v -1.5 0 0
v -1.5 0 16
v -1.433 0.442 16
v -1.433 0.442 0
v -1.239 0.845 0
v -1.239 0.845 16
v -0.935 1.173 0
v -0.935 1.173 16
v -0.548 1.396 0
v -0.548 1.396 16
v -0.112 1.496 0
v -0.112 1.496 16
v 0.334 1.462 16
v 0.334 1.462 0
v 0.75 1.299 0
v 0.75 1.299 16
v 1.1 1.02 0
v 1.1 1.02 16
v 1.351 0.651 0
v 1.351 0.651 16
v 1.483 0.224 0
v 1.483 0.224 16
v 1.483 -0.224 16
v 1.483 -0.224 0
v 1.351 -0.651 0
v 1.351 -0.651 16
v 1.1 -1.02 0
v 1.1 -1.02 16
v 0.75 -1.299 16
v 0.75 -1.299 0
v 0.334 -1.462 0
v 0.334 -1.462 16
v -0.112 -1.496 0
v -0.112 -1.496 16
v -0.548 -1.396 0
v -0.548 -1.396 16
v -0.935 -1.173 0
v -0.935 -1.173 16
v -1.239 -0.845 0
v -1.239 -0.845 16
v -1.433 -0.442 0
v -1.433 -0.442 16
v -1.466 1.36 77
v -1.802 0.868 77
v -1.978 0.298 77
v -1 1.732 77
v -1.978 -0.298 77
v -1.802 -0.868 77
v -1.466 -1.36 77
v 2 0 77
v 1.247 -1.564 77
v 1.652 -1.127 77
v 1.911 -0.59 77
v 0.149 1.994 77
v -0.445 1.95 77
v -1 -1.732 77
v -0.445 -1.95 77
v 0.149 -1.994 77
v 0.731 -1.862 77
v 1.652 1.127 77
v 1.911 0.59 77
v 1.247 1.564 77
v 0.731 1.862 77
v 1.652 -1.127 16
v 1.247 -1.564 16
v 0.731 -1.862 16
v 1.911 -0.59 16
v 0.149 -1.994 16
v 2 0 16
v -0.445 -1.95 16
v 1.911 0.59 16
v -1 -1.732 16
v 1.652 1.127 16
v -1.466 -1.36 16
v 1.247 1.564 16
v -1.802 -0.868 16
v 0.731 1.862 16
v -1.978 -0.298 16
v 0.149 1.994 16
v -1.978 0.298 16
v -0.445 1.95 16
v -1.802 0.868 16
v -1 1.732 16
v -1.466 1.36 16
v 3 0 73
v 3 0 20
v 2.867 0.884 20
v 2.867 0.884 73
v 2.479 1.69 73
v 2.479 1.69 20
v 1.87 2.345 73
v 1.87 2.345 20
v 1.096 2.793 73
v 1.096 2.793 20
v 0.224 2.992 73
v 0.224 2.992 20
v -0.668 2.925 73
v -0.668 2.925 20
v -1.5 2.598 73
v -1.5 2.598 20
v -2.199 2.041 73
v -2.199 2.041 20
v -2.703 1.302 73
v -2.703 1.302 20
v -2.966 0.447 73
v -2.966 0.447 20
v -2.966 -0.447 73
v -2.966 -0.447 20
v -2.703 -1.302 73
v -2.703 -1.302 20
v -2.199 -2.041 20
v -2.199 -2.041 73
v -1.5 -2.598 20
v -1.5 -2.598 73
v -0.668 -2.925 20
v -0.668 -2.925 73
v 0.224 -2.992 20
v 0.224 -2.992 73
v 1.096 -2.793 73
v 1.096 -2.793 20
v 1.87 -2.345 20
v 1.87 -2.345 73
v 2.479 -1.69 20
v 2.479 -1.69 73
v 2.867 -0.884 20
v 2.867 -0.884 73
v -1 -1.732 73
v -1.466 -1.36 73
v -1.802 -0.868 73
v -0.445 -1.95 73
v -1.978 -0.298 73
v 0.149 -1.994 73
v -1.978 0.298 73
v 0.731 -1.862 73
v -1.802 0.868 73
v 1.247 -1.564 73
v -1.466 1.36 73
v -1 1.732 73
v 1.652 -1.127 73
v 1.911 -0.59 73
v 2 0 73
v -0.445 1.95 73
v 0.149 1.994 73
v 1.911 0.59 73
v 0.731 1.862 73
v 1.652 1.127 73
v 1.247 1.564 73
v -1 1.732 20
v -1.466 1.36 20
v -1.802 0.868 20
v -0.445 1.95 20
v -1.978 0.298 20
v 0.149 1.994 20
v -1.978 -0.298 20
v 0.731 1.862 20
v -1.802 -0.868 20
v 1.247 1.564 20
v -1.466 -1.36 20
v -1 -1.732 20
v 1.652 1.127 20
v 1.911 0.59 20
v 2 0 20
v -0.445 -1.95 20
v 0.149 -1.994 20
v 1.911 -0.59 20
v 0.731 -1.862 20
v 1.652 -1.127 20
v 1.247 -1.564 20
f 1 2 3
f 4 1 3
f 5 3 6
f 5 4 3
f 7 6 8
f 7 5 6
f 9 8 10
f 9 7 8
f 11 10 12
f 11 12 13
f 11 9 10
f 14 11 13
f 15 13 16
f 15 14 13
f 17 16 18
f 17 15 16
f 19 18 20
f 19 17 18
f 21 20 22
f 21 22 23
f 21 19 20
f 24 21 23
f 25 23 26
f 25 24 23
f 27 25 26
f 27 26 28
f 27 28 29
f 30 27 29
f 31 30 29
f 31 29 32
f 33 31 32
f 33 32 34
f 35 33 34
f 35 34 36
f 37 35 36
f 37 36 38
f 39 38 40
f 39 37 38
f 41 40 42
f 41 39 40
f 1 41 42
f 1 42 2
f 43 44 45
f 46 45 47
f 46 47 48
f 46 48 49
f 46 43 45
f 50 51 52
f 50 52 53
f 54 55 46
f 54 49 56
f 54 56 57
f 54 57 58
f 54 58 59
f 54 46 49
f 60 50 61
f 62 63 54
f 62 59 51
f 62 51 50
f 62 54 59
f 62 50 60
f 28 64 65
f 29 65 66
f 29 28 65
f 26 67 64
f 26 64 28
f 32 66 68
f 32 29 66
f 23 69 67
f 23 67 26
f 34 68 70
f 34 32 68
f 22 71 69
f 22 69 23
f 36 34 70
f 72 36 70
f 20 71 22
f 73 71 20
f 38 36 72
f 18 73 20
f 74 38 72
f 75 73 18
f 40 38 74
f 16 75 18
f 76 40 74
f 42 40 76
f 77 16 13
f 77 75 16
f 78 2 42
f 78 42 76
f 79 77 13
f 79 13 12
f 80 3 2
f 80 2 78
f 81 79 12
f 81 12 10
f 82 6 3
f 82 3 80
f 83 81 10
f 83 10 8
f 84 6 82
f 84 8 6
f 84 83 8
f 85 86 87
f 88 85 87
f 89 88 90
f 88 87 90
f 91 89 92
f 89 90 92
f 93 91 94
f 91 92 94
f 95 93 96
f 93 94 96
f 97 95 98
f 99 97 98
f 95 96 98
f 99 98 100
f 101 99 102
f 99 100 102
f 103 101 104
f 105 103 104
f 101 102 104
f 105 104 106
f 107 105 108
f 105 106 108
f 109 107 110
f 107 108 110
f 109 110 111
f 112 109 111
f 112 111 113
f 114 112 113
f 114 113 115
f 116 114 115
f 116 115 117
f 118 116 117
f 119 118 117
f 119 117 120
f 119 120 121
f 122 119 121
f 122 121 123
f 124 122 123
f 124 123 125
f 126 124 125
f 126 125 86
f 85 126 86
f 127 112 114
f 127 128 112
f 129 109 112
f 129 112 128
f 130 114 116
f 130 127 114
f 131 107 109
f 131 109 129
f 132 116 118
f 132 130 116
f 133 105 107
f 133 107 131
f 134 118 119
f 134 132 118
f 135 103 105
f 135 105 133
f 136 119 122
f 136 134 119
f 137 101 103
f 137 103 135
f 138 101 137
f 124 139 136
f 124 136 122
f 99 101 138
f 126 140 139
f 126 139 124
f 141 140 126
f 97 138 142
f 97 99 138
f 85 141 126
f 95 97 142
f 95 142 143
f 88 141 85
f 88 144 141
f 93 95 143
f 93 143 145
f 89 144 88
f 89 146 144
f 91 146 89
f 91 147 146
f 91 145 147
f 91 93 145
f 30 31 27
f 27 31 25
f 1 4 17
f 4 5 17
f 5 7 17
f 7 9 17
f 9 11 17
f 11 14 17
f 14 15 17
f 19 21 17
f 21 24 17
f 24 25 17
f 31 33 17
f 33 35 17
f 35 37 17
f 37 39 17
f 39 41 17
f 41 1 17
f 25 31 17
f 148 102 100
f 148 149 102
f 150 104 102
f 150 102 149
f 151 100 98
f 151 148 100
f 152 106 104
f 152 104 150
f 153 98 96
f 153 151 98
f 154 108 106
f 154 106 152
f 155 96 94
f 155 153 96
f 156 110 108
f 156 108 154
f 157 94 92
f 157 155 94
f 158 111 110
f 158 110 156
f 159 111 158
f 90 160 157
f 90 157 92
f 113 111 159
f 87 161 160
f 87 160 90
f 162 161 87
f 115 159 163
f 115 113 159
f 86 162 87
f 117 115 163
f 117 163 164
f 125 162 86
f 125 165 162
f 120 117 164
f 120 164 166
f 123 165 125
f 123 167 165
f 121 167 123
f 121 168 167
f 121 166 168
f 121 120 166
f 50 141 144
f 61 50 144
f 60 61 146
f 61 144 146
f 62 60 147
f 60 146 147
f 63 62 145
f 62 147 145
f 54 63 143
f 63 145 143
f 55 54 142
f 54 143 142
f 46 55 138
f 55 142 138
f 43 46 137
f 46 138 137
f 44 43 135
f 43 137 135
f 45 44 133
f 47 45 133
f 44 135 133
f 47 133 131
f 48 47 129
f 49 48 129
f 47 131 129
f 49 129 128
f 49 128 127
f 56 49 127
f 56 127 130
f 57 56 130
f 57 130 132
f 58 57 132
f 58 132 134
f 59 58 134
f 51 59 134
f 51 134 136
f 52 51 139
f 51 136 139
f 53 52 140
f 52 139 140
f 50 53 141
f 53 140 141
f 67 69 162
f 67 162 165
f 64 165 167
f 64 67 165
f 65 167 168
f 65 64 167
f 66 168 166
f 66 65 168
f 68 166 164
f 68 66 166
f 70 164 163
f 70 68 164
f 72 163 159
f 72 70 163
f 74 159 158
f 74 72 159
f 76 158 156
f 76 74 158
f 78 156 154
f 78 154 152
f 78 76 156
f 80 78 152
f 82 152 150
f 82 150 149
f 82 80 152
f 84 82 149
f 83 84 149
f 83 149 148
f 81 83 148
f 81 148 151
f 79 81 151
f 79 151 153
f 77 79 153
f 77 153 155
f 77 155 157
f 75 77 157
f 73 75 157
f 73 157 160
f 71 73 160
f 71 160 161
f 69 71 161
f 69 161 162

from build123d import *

# Parameters (mm, degrees)
ESBO_O1_R                = 3
RESSALTO_EXTRUS_O1_DEPTH = 77
CORTE_EXTRUS_O1_START    = -4
ESBO_O2_R                = 3
ESBO_O2_R_2              = 2
CORTE_EXTRUS_O1_DEPTH    = 4
ESBO_O3_R                = 3
ESBO_O3_R_2              = 2
CORTE_EXTRUS_O2_DEPTH    = 20
ESBO_O4_R                = 2.5
ESBO_O4_R_2              = 1.5
CORTE_EXTRUS_O3_DEPTH    = 16


with BuildPart() as part:
    # Esboço1 → Ressalto-extrusão1 (new body)
    with BuildSketch(Plane.XY):
        Circle(ESBO_O1_R)
    extrude(amount=RESSALTO_EXTRUS_O1_DEPTH)

    # Esboço2 → Corte-extrusão1 (cut)
    with BuildSketch(Plane.XY.offset(77).offset(CORTE_EXTRUS_O1_START)):
        Circle(ESBO_O2_R)
        Circle(ESBO_O2_R_2, mode=Mode.SUBTRACT)
    extrude(amount=CORTE_EXTRUS_O1_DEPTH, mode=Mode.SUBTRACT)

    # Esboço3 → Corte-extrusão2 (cut)
    with BuildSketch(Plane(origin=(0, 0, 0), x_dir=(-1, 0, 0), z_dir=(0, 0, -1))):
        with Locations(Location((0, 0, 0), (0, 0, 180))):
            Circle(ESBO_O3_R)
        with Locations(Location((0, 0, 0), (0, 0, 180))):
            Circle(ESBO_O3_R_2, mode=Mode.SUBTRACT)
    extrude(amount=-CORTE_EXTRUS_O2_DEPTH, mode=Mode.SUBTRACT)

    # Esboço4 → Corte-extrusão3 (cut)
    with BuildSketch(Plane(origin=(0, 0, 0), x_dir=(-1, 0, 0), z_dir=(0, 0, -1))):
        Circle(ESBO_O4_R)
        Circle(ESBO_O4_R_2, mode=Mode.SUBTRACT)
    extrude(amount=-CORTE_EXTRUS_O3_DEPTH, mode=Mode.SUBTRACT)


solid = part.part
